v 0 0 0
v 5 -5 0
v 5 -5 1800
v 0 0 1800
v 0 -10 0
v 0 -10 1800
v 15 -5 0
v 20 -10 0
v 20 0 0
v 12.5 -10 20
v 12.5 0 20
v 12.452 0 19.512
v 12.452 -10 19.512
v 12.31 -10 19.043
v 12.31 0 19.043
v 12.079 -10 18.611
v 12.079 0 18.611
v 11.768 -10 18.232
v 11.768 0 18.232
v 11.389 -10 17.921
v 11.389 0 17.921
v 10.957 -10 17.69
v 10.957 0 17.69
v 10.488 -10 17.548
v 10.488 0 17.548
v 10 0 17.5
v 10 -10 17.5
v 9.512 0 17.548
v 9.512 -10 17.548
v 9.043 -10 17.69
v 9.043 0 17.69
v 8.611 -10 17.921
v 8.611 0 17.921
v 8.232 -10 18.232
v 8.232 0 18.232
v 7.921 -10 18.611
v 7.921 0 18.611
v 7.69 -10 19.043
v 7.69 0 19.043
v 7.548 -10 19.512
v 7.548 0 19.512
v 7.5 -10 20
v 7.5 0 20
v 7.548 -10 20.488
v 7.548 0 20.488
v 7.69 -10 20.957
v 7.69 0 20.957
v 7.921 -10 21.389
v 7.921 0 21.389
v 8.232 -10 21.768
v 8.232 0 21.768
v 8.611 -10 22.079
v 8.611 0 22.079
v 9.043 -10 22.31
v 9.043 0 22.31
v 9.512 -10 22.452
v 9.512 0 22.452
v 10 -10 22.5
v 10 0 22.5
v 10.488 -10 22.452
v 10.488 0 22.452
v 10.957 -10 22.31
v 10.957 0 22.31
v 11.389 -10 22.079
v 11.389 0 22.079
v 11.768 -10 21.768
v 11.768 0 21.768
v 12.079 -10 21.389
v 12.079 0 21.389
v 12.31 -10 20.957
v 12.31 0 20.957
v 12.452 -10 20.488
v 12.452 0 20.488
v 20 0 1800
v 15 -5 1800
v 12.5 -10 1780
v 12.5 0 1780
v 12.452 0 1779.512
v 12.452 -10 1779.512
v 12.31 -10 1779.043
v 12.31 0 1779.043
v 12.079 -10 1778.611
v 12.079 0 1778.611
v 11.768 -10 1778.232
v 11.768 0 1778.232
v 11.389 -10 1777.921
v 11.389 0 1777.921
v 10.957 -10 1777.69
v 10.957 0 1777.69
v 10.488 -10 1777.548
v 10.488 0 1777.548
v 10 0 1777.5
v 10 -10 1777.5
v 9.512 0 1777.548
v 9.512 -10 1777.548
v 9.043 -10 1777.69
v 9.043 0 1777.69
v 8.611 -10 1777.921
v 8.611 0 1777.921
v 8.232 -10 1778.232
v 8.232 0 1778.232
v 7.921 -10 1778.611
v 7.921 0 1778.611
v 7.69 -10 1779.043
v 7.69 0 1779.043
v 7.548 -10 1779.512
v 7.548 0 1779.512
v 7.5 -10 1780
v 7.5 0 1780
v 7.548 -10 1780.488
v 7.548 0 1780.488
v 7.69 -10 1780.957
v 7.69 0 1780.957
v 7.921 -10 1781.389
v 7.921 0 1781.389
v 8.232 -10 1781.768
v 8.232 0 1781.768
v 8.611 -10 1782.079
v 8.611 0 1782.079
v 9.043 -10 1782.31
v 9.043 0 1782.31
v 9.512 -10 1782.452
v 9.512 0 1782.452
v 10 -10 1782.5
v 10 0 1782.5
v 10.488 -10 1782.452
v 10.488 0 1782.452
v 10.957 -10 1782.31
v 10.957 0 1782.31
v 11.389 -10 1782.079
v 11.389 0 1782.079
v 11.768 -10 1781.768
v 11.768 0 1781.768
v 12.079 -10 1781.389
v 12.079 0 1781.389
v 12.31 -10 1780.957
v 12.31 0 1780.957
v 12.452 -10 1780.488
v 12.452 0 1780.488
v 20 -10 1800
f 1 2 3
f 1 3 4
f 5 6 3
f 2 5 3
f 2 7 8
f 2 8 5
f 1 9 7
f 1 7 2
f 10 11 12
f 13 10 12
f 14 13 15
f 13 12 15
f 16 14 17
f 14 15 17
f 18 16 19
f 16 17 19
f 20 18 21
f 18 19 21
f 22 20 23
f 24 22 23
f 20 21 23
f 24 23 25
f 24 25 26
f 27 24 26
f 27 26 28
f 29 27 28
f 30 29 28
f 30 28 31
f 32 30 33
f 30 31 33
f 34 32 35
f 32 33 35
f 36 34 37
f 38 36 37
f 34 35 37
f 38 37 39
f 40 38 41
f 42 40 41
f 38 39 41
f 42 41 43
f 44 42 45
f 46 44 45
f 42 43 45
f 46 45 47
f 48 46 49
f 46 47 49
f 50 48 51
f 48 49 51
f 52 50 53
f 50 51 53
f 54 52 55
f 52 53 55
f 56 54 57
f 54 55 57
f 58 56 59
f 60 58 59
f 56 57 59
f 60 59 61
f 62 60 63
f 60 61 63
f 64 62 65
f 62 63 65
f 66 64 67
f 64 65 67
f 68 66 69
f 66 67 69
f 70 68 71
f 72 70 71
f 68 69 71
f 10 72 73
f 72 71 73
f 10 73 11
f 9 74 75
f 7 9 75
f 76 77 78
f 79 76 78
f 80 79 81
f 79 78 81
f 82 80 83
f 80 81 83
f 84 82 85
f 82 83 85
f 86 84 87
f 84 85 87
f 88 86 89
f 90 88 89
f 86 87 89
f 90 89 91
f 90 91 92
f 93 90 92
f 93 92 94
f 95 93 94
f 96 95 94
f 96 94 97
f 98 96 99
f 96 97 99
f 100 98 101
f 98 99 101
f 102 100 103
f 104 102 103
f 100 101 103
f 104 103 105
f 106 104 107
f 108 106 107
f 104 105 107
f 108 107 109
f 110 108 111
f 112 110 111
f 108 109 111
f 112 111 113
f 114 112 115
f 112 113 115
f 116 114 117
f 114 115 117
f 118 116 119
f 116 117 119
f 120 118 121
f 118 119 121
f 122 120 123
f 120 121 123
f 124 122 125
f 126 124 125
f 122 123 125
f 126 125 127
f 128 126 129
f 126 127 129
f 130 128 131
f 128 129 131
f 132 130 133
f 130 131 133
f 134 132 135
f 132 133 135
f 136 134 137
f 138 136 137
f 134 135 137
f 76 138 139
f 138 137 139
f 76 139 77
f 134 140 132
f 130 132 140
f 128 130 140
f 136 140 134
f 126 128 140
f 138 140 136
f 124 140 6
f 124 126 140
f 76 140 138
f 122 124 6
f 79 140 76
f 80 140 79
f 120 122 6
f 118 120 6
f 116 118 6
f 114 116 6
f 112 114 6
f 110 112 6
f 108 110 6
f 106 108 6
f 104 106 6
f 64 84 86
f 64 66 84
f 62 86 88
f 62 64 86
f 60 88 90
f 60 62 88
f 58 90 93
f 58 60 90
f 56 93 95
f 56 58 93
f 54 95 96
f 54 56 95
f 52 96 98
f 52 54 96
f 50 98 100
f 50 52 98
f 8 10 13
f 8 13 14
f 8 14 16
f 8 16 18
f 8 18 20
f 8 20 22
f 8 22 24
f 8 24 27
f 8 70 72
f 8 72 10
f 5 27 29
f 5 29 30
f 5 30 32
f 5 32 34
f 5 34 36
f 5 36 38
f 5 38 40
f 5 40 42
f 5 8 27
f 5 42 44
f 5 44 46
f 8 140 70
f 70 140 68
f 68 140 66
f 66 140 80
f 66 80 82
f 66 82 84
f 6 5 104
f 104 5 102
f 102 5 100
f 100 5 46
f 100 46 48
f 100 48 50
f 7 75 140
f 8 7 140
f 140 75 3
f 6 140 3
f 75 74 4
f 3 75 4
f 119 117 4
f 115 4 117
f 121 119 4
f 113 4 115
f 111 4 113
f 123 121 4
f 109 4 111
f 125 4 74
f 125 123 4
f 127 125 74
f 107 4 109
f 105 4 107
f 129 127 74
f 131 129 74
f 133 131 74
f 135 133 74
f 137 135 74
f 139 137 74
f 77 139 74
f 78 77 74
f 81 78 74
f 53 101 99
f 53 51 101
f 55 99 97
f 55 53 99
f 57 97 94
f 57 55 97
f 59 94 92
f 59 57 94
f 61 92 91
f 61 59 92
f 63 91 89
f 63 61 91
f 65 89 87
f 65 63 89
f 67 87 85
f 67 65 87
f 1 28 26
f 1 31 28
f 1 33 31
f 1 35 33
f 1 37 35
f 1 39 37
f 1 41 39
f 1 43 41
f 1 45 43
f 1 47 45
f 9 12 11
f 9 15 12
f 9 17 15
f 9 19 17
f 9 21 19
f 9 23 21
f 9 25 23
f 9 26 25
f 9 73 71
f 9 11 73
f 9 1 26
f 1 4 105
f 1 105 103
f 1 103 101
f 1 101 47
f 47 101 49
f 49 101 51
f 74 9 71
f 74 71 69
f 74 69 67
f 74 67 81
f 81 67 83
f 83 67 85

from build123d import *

# Parameters (mm, degrees)
Y_KSEKLIK_EKSTR_ZYON1_DEPTH = 1800
IZIM2_R                     = 2.5
KES_EKSTR_ZYON5_DEPTH       = 10


with BuildPart() as part:
    # Çizim1 → Yükseklik-Ekstrüzyon1 (new body)
    with BuildSketch(Plane.XY):
        Polygon((0, 0), (20, 0), (15, -5), (20, -10), (0, -10), (5, -5), align=None)
    extrude(amount=Y_KSEKLIK_EKSTR_ZYON1_DEPTH)

    # Çizim2 → Kes-Ekstrüzyon5 (cut)
    with BuildSketch(Plane(origin=(0, 0, 0), x_dir=(1, 0, 0), z_dir=(0, 1, 0))):
        with Locations((10, -20)):
            Circle(IZIM2_R)
        with Locations((10, -1780)):
            Circle(IZIM2_R)
    extrude(amount=-KES_EKSTR_ZYON5_DEPTH, mode=Mode.SUBTRACT)


solid = part.part
